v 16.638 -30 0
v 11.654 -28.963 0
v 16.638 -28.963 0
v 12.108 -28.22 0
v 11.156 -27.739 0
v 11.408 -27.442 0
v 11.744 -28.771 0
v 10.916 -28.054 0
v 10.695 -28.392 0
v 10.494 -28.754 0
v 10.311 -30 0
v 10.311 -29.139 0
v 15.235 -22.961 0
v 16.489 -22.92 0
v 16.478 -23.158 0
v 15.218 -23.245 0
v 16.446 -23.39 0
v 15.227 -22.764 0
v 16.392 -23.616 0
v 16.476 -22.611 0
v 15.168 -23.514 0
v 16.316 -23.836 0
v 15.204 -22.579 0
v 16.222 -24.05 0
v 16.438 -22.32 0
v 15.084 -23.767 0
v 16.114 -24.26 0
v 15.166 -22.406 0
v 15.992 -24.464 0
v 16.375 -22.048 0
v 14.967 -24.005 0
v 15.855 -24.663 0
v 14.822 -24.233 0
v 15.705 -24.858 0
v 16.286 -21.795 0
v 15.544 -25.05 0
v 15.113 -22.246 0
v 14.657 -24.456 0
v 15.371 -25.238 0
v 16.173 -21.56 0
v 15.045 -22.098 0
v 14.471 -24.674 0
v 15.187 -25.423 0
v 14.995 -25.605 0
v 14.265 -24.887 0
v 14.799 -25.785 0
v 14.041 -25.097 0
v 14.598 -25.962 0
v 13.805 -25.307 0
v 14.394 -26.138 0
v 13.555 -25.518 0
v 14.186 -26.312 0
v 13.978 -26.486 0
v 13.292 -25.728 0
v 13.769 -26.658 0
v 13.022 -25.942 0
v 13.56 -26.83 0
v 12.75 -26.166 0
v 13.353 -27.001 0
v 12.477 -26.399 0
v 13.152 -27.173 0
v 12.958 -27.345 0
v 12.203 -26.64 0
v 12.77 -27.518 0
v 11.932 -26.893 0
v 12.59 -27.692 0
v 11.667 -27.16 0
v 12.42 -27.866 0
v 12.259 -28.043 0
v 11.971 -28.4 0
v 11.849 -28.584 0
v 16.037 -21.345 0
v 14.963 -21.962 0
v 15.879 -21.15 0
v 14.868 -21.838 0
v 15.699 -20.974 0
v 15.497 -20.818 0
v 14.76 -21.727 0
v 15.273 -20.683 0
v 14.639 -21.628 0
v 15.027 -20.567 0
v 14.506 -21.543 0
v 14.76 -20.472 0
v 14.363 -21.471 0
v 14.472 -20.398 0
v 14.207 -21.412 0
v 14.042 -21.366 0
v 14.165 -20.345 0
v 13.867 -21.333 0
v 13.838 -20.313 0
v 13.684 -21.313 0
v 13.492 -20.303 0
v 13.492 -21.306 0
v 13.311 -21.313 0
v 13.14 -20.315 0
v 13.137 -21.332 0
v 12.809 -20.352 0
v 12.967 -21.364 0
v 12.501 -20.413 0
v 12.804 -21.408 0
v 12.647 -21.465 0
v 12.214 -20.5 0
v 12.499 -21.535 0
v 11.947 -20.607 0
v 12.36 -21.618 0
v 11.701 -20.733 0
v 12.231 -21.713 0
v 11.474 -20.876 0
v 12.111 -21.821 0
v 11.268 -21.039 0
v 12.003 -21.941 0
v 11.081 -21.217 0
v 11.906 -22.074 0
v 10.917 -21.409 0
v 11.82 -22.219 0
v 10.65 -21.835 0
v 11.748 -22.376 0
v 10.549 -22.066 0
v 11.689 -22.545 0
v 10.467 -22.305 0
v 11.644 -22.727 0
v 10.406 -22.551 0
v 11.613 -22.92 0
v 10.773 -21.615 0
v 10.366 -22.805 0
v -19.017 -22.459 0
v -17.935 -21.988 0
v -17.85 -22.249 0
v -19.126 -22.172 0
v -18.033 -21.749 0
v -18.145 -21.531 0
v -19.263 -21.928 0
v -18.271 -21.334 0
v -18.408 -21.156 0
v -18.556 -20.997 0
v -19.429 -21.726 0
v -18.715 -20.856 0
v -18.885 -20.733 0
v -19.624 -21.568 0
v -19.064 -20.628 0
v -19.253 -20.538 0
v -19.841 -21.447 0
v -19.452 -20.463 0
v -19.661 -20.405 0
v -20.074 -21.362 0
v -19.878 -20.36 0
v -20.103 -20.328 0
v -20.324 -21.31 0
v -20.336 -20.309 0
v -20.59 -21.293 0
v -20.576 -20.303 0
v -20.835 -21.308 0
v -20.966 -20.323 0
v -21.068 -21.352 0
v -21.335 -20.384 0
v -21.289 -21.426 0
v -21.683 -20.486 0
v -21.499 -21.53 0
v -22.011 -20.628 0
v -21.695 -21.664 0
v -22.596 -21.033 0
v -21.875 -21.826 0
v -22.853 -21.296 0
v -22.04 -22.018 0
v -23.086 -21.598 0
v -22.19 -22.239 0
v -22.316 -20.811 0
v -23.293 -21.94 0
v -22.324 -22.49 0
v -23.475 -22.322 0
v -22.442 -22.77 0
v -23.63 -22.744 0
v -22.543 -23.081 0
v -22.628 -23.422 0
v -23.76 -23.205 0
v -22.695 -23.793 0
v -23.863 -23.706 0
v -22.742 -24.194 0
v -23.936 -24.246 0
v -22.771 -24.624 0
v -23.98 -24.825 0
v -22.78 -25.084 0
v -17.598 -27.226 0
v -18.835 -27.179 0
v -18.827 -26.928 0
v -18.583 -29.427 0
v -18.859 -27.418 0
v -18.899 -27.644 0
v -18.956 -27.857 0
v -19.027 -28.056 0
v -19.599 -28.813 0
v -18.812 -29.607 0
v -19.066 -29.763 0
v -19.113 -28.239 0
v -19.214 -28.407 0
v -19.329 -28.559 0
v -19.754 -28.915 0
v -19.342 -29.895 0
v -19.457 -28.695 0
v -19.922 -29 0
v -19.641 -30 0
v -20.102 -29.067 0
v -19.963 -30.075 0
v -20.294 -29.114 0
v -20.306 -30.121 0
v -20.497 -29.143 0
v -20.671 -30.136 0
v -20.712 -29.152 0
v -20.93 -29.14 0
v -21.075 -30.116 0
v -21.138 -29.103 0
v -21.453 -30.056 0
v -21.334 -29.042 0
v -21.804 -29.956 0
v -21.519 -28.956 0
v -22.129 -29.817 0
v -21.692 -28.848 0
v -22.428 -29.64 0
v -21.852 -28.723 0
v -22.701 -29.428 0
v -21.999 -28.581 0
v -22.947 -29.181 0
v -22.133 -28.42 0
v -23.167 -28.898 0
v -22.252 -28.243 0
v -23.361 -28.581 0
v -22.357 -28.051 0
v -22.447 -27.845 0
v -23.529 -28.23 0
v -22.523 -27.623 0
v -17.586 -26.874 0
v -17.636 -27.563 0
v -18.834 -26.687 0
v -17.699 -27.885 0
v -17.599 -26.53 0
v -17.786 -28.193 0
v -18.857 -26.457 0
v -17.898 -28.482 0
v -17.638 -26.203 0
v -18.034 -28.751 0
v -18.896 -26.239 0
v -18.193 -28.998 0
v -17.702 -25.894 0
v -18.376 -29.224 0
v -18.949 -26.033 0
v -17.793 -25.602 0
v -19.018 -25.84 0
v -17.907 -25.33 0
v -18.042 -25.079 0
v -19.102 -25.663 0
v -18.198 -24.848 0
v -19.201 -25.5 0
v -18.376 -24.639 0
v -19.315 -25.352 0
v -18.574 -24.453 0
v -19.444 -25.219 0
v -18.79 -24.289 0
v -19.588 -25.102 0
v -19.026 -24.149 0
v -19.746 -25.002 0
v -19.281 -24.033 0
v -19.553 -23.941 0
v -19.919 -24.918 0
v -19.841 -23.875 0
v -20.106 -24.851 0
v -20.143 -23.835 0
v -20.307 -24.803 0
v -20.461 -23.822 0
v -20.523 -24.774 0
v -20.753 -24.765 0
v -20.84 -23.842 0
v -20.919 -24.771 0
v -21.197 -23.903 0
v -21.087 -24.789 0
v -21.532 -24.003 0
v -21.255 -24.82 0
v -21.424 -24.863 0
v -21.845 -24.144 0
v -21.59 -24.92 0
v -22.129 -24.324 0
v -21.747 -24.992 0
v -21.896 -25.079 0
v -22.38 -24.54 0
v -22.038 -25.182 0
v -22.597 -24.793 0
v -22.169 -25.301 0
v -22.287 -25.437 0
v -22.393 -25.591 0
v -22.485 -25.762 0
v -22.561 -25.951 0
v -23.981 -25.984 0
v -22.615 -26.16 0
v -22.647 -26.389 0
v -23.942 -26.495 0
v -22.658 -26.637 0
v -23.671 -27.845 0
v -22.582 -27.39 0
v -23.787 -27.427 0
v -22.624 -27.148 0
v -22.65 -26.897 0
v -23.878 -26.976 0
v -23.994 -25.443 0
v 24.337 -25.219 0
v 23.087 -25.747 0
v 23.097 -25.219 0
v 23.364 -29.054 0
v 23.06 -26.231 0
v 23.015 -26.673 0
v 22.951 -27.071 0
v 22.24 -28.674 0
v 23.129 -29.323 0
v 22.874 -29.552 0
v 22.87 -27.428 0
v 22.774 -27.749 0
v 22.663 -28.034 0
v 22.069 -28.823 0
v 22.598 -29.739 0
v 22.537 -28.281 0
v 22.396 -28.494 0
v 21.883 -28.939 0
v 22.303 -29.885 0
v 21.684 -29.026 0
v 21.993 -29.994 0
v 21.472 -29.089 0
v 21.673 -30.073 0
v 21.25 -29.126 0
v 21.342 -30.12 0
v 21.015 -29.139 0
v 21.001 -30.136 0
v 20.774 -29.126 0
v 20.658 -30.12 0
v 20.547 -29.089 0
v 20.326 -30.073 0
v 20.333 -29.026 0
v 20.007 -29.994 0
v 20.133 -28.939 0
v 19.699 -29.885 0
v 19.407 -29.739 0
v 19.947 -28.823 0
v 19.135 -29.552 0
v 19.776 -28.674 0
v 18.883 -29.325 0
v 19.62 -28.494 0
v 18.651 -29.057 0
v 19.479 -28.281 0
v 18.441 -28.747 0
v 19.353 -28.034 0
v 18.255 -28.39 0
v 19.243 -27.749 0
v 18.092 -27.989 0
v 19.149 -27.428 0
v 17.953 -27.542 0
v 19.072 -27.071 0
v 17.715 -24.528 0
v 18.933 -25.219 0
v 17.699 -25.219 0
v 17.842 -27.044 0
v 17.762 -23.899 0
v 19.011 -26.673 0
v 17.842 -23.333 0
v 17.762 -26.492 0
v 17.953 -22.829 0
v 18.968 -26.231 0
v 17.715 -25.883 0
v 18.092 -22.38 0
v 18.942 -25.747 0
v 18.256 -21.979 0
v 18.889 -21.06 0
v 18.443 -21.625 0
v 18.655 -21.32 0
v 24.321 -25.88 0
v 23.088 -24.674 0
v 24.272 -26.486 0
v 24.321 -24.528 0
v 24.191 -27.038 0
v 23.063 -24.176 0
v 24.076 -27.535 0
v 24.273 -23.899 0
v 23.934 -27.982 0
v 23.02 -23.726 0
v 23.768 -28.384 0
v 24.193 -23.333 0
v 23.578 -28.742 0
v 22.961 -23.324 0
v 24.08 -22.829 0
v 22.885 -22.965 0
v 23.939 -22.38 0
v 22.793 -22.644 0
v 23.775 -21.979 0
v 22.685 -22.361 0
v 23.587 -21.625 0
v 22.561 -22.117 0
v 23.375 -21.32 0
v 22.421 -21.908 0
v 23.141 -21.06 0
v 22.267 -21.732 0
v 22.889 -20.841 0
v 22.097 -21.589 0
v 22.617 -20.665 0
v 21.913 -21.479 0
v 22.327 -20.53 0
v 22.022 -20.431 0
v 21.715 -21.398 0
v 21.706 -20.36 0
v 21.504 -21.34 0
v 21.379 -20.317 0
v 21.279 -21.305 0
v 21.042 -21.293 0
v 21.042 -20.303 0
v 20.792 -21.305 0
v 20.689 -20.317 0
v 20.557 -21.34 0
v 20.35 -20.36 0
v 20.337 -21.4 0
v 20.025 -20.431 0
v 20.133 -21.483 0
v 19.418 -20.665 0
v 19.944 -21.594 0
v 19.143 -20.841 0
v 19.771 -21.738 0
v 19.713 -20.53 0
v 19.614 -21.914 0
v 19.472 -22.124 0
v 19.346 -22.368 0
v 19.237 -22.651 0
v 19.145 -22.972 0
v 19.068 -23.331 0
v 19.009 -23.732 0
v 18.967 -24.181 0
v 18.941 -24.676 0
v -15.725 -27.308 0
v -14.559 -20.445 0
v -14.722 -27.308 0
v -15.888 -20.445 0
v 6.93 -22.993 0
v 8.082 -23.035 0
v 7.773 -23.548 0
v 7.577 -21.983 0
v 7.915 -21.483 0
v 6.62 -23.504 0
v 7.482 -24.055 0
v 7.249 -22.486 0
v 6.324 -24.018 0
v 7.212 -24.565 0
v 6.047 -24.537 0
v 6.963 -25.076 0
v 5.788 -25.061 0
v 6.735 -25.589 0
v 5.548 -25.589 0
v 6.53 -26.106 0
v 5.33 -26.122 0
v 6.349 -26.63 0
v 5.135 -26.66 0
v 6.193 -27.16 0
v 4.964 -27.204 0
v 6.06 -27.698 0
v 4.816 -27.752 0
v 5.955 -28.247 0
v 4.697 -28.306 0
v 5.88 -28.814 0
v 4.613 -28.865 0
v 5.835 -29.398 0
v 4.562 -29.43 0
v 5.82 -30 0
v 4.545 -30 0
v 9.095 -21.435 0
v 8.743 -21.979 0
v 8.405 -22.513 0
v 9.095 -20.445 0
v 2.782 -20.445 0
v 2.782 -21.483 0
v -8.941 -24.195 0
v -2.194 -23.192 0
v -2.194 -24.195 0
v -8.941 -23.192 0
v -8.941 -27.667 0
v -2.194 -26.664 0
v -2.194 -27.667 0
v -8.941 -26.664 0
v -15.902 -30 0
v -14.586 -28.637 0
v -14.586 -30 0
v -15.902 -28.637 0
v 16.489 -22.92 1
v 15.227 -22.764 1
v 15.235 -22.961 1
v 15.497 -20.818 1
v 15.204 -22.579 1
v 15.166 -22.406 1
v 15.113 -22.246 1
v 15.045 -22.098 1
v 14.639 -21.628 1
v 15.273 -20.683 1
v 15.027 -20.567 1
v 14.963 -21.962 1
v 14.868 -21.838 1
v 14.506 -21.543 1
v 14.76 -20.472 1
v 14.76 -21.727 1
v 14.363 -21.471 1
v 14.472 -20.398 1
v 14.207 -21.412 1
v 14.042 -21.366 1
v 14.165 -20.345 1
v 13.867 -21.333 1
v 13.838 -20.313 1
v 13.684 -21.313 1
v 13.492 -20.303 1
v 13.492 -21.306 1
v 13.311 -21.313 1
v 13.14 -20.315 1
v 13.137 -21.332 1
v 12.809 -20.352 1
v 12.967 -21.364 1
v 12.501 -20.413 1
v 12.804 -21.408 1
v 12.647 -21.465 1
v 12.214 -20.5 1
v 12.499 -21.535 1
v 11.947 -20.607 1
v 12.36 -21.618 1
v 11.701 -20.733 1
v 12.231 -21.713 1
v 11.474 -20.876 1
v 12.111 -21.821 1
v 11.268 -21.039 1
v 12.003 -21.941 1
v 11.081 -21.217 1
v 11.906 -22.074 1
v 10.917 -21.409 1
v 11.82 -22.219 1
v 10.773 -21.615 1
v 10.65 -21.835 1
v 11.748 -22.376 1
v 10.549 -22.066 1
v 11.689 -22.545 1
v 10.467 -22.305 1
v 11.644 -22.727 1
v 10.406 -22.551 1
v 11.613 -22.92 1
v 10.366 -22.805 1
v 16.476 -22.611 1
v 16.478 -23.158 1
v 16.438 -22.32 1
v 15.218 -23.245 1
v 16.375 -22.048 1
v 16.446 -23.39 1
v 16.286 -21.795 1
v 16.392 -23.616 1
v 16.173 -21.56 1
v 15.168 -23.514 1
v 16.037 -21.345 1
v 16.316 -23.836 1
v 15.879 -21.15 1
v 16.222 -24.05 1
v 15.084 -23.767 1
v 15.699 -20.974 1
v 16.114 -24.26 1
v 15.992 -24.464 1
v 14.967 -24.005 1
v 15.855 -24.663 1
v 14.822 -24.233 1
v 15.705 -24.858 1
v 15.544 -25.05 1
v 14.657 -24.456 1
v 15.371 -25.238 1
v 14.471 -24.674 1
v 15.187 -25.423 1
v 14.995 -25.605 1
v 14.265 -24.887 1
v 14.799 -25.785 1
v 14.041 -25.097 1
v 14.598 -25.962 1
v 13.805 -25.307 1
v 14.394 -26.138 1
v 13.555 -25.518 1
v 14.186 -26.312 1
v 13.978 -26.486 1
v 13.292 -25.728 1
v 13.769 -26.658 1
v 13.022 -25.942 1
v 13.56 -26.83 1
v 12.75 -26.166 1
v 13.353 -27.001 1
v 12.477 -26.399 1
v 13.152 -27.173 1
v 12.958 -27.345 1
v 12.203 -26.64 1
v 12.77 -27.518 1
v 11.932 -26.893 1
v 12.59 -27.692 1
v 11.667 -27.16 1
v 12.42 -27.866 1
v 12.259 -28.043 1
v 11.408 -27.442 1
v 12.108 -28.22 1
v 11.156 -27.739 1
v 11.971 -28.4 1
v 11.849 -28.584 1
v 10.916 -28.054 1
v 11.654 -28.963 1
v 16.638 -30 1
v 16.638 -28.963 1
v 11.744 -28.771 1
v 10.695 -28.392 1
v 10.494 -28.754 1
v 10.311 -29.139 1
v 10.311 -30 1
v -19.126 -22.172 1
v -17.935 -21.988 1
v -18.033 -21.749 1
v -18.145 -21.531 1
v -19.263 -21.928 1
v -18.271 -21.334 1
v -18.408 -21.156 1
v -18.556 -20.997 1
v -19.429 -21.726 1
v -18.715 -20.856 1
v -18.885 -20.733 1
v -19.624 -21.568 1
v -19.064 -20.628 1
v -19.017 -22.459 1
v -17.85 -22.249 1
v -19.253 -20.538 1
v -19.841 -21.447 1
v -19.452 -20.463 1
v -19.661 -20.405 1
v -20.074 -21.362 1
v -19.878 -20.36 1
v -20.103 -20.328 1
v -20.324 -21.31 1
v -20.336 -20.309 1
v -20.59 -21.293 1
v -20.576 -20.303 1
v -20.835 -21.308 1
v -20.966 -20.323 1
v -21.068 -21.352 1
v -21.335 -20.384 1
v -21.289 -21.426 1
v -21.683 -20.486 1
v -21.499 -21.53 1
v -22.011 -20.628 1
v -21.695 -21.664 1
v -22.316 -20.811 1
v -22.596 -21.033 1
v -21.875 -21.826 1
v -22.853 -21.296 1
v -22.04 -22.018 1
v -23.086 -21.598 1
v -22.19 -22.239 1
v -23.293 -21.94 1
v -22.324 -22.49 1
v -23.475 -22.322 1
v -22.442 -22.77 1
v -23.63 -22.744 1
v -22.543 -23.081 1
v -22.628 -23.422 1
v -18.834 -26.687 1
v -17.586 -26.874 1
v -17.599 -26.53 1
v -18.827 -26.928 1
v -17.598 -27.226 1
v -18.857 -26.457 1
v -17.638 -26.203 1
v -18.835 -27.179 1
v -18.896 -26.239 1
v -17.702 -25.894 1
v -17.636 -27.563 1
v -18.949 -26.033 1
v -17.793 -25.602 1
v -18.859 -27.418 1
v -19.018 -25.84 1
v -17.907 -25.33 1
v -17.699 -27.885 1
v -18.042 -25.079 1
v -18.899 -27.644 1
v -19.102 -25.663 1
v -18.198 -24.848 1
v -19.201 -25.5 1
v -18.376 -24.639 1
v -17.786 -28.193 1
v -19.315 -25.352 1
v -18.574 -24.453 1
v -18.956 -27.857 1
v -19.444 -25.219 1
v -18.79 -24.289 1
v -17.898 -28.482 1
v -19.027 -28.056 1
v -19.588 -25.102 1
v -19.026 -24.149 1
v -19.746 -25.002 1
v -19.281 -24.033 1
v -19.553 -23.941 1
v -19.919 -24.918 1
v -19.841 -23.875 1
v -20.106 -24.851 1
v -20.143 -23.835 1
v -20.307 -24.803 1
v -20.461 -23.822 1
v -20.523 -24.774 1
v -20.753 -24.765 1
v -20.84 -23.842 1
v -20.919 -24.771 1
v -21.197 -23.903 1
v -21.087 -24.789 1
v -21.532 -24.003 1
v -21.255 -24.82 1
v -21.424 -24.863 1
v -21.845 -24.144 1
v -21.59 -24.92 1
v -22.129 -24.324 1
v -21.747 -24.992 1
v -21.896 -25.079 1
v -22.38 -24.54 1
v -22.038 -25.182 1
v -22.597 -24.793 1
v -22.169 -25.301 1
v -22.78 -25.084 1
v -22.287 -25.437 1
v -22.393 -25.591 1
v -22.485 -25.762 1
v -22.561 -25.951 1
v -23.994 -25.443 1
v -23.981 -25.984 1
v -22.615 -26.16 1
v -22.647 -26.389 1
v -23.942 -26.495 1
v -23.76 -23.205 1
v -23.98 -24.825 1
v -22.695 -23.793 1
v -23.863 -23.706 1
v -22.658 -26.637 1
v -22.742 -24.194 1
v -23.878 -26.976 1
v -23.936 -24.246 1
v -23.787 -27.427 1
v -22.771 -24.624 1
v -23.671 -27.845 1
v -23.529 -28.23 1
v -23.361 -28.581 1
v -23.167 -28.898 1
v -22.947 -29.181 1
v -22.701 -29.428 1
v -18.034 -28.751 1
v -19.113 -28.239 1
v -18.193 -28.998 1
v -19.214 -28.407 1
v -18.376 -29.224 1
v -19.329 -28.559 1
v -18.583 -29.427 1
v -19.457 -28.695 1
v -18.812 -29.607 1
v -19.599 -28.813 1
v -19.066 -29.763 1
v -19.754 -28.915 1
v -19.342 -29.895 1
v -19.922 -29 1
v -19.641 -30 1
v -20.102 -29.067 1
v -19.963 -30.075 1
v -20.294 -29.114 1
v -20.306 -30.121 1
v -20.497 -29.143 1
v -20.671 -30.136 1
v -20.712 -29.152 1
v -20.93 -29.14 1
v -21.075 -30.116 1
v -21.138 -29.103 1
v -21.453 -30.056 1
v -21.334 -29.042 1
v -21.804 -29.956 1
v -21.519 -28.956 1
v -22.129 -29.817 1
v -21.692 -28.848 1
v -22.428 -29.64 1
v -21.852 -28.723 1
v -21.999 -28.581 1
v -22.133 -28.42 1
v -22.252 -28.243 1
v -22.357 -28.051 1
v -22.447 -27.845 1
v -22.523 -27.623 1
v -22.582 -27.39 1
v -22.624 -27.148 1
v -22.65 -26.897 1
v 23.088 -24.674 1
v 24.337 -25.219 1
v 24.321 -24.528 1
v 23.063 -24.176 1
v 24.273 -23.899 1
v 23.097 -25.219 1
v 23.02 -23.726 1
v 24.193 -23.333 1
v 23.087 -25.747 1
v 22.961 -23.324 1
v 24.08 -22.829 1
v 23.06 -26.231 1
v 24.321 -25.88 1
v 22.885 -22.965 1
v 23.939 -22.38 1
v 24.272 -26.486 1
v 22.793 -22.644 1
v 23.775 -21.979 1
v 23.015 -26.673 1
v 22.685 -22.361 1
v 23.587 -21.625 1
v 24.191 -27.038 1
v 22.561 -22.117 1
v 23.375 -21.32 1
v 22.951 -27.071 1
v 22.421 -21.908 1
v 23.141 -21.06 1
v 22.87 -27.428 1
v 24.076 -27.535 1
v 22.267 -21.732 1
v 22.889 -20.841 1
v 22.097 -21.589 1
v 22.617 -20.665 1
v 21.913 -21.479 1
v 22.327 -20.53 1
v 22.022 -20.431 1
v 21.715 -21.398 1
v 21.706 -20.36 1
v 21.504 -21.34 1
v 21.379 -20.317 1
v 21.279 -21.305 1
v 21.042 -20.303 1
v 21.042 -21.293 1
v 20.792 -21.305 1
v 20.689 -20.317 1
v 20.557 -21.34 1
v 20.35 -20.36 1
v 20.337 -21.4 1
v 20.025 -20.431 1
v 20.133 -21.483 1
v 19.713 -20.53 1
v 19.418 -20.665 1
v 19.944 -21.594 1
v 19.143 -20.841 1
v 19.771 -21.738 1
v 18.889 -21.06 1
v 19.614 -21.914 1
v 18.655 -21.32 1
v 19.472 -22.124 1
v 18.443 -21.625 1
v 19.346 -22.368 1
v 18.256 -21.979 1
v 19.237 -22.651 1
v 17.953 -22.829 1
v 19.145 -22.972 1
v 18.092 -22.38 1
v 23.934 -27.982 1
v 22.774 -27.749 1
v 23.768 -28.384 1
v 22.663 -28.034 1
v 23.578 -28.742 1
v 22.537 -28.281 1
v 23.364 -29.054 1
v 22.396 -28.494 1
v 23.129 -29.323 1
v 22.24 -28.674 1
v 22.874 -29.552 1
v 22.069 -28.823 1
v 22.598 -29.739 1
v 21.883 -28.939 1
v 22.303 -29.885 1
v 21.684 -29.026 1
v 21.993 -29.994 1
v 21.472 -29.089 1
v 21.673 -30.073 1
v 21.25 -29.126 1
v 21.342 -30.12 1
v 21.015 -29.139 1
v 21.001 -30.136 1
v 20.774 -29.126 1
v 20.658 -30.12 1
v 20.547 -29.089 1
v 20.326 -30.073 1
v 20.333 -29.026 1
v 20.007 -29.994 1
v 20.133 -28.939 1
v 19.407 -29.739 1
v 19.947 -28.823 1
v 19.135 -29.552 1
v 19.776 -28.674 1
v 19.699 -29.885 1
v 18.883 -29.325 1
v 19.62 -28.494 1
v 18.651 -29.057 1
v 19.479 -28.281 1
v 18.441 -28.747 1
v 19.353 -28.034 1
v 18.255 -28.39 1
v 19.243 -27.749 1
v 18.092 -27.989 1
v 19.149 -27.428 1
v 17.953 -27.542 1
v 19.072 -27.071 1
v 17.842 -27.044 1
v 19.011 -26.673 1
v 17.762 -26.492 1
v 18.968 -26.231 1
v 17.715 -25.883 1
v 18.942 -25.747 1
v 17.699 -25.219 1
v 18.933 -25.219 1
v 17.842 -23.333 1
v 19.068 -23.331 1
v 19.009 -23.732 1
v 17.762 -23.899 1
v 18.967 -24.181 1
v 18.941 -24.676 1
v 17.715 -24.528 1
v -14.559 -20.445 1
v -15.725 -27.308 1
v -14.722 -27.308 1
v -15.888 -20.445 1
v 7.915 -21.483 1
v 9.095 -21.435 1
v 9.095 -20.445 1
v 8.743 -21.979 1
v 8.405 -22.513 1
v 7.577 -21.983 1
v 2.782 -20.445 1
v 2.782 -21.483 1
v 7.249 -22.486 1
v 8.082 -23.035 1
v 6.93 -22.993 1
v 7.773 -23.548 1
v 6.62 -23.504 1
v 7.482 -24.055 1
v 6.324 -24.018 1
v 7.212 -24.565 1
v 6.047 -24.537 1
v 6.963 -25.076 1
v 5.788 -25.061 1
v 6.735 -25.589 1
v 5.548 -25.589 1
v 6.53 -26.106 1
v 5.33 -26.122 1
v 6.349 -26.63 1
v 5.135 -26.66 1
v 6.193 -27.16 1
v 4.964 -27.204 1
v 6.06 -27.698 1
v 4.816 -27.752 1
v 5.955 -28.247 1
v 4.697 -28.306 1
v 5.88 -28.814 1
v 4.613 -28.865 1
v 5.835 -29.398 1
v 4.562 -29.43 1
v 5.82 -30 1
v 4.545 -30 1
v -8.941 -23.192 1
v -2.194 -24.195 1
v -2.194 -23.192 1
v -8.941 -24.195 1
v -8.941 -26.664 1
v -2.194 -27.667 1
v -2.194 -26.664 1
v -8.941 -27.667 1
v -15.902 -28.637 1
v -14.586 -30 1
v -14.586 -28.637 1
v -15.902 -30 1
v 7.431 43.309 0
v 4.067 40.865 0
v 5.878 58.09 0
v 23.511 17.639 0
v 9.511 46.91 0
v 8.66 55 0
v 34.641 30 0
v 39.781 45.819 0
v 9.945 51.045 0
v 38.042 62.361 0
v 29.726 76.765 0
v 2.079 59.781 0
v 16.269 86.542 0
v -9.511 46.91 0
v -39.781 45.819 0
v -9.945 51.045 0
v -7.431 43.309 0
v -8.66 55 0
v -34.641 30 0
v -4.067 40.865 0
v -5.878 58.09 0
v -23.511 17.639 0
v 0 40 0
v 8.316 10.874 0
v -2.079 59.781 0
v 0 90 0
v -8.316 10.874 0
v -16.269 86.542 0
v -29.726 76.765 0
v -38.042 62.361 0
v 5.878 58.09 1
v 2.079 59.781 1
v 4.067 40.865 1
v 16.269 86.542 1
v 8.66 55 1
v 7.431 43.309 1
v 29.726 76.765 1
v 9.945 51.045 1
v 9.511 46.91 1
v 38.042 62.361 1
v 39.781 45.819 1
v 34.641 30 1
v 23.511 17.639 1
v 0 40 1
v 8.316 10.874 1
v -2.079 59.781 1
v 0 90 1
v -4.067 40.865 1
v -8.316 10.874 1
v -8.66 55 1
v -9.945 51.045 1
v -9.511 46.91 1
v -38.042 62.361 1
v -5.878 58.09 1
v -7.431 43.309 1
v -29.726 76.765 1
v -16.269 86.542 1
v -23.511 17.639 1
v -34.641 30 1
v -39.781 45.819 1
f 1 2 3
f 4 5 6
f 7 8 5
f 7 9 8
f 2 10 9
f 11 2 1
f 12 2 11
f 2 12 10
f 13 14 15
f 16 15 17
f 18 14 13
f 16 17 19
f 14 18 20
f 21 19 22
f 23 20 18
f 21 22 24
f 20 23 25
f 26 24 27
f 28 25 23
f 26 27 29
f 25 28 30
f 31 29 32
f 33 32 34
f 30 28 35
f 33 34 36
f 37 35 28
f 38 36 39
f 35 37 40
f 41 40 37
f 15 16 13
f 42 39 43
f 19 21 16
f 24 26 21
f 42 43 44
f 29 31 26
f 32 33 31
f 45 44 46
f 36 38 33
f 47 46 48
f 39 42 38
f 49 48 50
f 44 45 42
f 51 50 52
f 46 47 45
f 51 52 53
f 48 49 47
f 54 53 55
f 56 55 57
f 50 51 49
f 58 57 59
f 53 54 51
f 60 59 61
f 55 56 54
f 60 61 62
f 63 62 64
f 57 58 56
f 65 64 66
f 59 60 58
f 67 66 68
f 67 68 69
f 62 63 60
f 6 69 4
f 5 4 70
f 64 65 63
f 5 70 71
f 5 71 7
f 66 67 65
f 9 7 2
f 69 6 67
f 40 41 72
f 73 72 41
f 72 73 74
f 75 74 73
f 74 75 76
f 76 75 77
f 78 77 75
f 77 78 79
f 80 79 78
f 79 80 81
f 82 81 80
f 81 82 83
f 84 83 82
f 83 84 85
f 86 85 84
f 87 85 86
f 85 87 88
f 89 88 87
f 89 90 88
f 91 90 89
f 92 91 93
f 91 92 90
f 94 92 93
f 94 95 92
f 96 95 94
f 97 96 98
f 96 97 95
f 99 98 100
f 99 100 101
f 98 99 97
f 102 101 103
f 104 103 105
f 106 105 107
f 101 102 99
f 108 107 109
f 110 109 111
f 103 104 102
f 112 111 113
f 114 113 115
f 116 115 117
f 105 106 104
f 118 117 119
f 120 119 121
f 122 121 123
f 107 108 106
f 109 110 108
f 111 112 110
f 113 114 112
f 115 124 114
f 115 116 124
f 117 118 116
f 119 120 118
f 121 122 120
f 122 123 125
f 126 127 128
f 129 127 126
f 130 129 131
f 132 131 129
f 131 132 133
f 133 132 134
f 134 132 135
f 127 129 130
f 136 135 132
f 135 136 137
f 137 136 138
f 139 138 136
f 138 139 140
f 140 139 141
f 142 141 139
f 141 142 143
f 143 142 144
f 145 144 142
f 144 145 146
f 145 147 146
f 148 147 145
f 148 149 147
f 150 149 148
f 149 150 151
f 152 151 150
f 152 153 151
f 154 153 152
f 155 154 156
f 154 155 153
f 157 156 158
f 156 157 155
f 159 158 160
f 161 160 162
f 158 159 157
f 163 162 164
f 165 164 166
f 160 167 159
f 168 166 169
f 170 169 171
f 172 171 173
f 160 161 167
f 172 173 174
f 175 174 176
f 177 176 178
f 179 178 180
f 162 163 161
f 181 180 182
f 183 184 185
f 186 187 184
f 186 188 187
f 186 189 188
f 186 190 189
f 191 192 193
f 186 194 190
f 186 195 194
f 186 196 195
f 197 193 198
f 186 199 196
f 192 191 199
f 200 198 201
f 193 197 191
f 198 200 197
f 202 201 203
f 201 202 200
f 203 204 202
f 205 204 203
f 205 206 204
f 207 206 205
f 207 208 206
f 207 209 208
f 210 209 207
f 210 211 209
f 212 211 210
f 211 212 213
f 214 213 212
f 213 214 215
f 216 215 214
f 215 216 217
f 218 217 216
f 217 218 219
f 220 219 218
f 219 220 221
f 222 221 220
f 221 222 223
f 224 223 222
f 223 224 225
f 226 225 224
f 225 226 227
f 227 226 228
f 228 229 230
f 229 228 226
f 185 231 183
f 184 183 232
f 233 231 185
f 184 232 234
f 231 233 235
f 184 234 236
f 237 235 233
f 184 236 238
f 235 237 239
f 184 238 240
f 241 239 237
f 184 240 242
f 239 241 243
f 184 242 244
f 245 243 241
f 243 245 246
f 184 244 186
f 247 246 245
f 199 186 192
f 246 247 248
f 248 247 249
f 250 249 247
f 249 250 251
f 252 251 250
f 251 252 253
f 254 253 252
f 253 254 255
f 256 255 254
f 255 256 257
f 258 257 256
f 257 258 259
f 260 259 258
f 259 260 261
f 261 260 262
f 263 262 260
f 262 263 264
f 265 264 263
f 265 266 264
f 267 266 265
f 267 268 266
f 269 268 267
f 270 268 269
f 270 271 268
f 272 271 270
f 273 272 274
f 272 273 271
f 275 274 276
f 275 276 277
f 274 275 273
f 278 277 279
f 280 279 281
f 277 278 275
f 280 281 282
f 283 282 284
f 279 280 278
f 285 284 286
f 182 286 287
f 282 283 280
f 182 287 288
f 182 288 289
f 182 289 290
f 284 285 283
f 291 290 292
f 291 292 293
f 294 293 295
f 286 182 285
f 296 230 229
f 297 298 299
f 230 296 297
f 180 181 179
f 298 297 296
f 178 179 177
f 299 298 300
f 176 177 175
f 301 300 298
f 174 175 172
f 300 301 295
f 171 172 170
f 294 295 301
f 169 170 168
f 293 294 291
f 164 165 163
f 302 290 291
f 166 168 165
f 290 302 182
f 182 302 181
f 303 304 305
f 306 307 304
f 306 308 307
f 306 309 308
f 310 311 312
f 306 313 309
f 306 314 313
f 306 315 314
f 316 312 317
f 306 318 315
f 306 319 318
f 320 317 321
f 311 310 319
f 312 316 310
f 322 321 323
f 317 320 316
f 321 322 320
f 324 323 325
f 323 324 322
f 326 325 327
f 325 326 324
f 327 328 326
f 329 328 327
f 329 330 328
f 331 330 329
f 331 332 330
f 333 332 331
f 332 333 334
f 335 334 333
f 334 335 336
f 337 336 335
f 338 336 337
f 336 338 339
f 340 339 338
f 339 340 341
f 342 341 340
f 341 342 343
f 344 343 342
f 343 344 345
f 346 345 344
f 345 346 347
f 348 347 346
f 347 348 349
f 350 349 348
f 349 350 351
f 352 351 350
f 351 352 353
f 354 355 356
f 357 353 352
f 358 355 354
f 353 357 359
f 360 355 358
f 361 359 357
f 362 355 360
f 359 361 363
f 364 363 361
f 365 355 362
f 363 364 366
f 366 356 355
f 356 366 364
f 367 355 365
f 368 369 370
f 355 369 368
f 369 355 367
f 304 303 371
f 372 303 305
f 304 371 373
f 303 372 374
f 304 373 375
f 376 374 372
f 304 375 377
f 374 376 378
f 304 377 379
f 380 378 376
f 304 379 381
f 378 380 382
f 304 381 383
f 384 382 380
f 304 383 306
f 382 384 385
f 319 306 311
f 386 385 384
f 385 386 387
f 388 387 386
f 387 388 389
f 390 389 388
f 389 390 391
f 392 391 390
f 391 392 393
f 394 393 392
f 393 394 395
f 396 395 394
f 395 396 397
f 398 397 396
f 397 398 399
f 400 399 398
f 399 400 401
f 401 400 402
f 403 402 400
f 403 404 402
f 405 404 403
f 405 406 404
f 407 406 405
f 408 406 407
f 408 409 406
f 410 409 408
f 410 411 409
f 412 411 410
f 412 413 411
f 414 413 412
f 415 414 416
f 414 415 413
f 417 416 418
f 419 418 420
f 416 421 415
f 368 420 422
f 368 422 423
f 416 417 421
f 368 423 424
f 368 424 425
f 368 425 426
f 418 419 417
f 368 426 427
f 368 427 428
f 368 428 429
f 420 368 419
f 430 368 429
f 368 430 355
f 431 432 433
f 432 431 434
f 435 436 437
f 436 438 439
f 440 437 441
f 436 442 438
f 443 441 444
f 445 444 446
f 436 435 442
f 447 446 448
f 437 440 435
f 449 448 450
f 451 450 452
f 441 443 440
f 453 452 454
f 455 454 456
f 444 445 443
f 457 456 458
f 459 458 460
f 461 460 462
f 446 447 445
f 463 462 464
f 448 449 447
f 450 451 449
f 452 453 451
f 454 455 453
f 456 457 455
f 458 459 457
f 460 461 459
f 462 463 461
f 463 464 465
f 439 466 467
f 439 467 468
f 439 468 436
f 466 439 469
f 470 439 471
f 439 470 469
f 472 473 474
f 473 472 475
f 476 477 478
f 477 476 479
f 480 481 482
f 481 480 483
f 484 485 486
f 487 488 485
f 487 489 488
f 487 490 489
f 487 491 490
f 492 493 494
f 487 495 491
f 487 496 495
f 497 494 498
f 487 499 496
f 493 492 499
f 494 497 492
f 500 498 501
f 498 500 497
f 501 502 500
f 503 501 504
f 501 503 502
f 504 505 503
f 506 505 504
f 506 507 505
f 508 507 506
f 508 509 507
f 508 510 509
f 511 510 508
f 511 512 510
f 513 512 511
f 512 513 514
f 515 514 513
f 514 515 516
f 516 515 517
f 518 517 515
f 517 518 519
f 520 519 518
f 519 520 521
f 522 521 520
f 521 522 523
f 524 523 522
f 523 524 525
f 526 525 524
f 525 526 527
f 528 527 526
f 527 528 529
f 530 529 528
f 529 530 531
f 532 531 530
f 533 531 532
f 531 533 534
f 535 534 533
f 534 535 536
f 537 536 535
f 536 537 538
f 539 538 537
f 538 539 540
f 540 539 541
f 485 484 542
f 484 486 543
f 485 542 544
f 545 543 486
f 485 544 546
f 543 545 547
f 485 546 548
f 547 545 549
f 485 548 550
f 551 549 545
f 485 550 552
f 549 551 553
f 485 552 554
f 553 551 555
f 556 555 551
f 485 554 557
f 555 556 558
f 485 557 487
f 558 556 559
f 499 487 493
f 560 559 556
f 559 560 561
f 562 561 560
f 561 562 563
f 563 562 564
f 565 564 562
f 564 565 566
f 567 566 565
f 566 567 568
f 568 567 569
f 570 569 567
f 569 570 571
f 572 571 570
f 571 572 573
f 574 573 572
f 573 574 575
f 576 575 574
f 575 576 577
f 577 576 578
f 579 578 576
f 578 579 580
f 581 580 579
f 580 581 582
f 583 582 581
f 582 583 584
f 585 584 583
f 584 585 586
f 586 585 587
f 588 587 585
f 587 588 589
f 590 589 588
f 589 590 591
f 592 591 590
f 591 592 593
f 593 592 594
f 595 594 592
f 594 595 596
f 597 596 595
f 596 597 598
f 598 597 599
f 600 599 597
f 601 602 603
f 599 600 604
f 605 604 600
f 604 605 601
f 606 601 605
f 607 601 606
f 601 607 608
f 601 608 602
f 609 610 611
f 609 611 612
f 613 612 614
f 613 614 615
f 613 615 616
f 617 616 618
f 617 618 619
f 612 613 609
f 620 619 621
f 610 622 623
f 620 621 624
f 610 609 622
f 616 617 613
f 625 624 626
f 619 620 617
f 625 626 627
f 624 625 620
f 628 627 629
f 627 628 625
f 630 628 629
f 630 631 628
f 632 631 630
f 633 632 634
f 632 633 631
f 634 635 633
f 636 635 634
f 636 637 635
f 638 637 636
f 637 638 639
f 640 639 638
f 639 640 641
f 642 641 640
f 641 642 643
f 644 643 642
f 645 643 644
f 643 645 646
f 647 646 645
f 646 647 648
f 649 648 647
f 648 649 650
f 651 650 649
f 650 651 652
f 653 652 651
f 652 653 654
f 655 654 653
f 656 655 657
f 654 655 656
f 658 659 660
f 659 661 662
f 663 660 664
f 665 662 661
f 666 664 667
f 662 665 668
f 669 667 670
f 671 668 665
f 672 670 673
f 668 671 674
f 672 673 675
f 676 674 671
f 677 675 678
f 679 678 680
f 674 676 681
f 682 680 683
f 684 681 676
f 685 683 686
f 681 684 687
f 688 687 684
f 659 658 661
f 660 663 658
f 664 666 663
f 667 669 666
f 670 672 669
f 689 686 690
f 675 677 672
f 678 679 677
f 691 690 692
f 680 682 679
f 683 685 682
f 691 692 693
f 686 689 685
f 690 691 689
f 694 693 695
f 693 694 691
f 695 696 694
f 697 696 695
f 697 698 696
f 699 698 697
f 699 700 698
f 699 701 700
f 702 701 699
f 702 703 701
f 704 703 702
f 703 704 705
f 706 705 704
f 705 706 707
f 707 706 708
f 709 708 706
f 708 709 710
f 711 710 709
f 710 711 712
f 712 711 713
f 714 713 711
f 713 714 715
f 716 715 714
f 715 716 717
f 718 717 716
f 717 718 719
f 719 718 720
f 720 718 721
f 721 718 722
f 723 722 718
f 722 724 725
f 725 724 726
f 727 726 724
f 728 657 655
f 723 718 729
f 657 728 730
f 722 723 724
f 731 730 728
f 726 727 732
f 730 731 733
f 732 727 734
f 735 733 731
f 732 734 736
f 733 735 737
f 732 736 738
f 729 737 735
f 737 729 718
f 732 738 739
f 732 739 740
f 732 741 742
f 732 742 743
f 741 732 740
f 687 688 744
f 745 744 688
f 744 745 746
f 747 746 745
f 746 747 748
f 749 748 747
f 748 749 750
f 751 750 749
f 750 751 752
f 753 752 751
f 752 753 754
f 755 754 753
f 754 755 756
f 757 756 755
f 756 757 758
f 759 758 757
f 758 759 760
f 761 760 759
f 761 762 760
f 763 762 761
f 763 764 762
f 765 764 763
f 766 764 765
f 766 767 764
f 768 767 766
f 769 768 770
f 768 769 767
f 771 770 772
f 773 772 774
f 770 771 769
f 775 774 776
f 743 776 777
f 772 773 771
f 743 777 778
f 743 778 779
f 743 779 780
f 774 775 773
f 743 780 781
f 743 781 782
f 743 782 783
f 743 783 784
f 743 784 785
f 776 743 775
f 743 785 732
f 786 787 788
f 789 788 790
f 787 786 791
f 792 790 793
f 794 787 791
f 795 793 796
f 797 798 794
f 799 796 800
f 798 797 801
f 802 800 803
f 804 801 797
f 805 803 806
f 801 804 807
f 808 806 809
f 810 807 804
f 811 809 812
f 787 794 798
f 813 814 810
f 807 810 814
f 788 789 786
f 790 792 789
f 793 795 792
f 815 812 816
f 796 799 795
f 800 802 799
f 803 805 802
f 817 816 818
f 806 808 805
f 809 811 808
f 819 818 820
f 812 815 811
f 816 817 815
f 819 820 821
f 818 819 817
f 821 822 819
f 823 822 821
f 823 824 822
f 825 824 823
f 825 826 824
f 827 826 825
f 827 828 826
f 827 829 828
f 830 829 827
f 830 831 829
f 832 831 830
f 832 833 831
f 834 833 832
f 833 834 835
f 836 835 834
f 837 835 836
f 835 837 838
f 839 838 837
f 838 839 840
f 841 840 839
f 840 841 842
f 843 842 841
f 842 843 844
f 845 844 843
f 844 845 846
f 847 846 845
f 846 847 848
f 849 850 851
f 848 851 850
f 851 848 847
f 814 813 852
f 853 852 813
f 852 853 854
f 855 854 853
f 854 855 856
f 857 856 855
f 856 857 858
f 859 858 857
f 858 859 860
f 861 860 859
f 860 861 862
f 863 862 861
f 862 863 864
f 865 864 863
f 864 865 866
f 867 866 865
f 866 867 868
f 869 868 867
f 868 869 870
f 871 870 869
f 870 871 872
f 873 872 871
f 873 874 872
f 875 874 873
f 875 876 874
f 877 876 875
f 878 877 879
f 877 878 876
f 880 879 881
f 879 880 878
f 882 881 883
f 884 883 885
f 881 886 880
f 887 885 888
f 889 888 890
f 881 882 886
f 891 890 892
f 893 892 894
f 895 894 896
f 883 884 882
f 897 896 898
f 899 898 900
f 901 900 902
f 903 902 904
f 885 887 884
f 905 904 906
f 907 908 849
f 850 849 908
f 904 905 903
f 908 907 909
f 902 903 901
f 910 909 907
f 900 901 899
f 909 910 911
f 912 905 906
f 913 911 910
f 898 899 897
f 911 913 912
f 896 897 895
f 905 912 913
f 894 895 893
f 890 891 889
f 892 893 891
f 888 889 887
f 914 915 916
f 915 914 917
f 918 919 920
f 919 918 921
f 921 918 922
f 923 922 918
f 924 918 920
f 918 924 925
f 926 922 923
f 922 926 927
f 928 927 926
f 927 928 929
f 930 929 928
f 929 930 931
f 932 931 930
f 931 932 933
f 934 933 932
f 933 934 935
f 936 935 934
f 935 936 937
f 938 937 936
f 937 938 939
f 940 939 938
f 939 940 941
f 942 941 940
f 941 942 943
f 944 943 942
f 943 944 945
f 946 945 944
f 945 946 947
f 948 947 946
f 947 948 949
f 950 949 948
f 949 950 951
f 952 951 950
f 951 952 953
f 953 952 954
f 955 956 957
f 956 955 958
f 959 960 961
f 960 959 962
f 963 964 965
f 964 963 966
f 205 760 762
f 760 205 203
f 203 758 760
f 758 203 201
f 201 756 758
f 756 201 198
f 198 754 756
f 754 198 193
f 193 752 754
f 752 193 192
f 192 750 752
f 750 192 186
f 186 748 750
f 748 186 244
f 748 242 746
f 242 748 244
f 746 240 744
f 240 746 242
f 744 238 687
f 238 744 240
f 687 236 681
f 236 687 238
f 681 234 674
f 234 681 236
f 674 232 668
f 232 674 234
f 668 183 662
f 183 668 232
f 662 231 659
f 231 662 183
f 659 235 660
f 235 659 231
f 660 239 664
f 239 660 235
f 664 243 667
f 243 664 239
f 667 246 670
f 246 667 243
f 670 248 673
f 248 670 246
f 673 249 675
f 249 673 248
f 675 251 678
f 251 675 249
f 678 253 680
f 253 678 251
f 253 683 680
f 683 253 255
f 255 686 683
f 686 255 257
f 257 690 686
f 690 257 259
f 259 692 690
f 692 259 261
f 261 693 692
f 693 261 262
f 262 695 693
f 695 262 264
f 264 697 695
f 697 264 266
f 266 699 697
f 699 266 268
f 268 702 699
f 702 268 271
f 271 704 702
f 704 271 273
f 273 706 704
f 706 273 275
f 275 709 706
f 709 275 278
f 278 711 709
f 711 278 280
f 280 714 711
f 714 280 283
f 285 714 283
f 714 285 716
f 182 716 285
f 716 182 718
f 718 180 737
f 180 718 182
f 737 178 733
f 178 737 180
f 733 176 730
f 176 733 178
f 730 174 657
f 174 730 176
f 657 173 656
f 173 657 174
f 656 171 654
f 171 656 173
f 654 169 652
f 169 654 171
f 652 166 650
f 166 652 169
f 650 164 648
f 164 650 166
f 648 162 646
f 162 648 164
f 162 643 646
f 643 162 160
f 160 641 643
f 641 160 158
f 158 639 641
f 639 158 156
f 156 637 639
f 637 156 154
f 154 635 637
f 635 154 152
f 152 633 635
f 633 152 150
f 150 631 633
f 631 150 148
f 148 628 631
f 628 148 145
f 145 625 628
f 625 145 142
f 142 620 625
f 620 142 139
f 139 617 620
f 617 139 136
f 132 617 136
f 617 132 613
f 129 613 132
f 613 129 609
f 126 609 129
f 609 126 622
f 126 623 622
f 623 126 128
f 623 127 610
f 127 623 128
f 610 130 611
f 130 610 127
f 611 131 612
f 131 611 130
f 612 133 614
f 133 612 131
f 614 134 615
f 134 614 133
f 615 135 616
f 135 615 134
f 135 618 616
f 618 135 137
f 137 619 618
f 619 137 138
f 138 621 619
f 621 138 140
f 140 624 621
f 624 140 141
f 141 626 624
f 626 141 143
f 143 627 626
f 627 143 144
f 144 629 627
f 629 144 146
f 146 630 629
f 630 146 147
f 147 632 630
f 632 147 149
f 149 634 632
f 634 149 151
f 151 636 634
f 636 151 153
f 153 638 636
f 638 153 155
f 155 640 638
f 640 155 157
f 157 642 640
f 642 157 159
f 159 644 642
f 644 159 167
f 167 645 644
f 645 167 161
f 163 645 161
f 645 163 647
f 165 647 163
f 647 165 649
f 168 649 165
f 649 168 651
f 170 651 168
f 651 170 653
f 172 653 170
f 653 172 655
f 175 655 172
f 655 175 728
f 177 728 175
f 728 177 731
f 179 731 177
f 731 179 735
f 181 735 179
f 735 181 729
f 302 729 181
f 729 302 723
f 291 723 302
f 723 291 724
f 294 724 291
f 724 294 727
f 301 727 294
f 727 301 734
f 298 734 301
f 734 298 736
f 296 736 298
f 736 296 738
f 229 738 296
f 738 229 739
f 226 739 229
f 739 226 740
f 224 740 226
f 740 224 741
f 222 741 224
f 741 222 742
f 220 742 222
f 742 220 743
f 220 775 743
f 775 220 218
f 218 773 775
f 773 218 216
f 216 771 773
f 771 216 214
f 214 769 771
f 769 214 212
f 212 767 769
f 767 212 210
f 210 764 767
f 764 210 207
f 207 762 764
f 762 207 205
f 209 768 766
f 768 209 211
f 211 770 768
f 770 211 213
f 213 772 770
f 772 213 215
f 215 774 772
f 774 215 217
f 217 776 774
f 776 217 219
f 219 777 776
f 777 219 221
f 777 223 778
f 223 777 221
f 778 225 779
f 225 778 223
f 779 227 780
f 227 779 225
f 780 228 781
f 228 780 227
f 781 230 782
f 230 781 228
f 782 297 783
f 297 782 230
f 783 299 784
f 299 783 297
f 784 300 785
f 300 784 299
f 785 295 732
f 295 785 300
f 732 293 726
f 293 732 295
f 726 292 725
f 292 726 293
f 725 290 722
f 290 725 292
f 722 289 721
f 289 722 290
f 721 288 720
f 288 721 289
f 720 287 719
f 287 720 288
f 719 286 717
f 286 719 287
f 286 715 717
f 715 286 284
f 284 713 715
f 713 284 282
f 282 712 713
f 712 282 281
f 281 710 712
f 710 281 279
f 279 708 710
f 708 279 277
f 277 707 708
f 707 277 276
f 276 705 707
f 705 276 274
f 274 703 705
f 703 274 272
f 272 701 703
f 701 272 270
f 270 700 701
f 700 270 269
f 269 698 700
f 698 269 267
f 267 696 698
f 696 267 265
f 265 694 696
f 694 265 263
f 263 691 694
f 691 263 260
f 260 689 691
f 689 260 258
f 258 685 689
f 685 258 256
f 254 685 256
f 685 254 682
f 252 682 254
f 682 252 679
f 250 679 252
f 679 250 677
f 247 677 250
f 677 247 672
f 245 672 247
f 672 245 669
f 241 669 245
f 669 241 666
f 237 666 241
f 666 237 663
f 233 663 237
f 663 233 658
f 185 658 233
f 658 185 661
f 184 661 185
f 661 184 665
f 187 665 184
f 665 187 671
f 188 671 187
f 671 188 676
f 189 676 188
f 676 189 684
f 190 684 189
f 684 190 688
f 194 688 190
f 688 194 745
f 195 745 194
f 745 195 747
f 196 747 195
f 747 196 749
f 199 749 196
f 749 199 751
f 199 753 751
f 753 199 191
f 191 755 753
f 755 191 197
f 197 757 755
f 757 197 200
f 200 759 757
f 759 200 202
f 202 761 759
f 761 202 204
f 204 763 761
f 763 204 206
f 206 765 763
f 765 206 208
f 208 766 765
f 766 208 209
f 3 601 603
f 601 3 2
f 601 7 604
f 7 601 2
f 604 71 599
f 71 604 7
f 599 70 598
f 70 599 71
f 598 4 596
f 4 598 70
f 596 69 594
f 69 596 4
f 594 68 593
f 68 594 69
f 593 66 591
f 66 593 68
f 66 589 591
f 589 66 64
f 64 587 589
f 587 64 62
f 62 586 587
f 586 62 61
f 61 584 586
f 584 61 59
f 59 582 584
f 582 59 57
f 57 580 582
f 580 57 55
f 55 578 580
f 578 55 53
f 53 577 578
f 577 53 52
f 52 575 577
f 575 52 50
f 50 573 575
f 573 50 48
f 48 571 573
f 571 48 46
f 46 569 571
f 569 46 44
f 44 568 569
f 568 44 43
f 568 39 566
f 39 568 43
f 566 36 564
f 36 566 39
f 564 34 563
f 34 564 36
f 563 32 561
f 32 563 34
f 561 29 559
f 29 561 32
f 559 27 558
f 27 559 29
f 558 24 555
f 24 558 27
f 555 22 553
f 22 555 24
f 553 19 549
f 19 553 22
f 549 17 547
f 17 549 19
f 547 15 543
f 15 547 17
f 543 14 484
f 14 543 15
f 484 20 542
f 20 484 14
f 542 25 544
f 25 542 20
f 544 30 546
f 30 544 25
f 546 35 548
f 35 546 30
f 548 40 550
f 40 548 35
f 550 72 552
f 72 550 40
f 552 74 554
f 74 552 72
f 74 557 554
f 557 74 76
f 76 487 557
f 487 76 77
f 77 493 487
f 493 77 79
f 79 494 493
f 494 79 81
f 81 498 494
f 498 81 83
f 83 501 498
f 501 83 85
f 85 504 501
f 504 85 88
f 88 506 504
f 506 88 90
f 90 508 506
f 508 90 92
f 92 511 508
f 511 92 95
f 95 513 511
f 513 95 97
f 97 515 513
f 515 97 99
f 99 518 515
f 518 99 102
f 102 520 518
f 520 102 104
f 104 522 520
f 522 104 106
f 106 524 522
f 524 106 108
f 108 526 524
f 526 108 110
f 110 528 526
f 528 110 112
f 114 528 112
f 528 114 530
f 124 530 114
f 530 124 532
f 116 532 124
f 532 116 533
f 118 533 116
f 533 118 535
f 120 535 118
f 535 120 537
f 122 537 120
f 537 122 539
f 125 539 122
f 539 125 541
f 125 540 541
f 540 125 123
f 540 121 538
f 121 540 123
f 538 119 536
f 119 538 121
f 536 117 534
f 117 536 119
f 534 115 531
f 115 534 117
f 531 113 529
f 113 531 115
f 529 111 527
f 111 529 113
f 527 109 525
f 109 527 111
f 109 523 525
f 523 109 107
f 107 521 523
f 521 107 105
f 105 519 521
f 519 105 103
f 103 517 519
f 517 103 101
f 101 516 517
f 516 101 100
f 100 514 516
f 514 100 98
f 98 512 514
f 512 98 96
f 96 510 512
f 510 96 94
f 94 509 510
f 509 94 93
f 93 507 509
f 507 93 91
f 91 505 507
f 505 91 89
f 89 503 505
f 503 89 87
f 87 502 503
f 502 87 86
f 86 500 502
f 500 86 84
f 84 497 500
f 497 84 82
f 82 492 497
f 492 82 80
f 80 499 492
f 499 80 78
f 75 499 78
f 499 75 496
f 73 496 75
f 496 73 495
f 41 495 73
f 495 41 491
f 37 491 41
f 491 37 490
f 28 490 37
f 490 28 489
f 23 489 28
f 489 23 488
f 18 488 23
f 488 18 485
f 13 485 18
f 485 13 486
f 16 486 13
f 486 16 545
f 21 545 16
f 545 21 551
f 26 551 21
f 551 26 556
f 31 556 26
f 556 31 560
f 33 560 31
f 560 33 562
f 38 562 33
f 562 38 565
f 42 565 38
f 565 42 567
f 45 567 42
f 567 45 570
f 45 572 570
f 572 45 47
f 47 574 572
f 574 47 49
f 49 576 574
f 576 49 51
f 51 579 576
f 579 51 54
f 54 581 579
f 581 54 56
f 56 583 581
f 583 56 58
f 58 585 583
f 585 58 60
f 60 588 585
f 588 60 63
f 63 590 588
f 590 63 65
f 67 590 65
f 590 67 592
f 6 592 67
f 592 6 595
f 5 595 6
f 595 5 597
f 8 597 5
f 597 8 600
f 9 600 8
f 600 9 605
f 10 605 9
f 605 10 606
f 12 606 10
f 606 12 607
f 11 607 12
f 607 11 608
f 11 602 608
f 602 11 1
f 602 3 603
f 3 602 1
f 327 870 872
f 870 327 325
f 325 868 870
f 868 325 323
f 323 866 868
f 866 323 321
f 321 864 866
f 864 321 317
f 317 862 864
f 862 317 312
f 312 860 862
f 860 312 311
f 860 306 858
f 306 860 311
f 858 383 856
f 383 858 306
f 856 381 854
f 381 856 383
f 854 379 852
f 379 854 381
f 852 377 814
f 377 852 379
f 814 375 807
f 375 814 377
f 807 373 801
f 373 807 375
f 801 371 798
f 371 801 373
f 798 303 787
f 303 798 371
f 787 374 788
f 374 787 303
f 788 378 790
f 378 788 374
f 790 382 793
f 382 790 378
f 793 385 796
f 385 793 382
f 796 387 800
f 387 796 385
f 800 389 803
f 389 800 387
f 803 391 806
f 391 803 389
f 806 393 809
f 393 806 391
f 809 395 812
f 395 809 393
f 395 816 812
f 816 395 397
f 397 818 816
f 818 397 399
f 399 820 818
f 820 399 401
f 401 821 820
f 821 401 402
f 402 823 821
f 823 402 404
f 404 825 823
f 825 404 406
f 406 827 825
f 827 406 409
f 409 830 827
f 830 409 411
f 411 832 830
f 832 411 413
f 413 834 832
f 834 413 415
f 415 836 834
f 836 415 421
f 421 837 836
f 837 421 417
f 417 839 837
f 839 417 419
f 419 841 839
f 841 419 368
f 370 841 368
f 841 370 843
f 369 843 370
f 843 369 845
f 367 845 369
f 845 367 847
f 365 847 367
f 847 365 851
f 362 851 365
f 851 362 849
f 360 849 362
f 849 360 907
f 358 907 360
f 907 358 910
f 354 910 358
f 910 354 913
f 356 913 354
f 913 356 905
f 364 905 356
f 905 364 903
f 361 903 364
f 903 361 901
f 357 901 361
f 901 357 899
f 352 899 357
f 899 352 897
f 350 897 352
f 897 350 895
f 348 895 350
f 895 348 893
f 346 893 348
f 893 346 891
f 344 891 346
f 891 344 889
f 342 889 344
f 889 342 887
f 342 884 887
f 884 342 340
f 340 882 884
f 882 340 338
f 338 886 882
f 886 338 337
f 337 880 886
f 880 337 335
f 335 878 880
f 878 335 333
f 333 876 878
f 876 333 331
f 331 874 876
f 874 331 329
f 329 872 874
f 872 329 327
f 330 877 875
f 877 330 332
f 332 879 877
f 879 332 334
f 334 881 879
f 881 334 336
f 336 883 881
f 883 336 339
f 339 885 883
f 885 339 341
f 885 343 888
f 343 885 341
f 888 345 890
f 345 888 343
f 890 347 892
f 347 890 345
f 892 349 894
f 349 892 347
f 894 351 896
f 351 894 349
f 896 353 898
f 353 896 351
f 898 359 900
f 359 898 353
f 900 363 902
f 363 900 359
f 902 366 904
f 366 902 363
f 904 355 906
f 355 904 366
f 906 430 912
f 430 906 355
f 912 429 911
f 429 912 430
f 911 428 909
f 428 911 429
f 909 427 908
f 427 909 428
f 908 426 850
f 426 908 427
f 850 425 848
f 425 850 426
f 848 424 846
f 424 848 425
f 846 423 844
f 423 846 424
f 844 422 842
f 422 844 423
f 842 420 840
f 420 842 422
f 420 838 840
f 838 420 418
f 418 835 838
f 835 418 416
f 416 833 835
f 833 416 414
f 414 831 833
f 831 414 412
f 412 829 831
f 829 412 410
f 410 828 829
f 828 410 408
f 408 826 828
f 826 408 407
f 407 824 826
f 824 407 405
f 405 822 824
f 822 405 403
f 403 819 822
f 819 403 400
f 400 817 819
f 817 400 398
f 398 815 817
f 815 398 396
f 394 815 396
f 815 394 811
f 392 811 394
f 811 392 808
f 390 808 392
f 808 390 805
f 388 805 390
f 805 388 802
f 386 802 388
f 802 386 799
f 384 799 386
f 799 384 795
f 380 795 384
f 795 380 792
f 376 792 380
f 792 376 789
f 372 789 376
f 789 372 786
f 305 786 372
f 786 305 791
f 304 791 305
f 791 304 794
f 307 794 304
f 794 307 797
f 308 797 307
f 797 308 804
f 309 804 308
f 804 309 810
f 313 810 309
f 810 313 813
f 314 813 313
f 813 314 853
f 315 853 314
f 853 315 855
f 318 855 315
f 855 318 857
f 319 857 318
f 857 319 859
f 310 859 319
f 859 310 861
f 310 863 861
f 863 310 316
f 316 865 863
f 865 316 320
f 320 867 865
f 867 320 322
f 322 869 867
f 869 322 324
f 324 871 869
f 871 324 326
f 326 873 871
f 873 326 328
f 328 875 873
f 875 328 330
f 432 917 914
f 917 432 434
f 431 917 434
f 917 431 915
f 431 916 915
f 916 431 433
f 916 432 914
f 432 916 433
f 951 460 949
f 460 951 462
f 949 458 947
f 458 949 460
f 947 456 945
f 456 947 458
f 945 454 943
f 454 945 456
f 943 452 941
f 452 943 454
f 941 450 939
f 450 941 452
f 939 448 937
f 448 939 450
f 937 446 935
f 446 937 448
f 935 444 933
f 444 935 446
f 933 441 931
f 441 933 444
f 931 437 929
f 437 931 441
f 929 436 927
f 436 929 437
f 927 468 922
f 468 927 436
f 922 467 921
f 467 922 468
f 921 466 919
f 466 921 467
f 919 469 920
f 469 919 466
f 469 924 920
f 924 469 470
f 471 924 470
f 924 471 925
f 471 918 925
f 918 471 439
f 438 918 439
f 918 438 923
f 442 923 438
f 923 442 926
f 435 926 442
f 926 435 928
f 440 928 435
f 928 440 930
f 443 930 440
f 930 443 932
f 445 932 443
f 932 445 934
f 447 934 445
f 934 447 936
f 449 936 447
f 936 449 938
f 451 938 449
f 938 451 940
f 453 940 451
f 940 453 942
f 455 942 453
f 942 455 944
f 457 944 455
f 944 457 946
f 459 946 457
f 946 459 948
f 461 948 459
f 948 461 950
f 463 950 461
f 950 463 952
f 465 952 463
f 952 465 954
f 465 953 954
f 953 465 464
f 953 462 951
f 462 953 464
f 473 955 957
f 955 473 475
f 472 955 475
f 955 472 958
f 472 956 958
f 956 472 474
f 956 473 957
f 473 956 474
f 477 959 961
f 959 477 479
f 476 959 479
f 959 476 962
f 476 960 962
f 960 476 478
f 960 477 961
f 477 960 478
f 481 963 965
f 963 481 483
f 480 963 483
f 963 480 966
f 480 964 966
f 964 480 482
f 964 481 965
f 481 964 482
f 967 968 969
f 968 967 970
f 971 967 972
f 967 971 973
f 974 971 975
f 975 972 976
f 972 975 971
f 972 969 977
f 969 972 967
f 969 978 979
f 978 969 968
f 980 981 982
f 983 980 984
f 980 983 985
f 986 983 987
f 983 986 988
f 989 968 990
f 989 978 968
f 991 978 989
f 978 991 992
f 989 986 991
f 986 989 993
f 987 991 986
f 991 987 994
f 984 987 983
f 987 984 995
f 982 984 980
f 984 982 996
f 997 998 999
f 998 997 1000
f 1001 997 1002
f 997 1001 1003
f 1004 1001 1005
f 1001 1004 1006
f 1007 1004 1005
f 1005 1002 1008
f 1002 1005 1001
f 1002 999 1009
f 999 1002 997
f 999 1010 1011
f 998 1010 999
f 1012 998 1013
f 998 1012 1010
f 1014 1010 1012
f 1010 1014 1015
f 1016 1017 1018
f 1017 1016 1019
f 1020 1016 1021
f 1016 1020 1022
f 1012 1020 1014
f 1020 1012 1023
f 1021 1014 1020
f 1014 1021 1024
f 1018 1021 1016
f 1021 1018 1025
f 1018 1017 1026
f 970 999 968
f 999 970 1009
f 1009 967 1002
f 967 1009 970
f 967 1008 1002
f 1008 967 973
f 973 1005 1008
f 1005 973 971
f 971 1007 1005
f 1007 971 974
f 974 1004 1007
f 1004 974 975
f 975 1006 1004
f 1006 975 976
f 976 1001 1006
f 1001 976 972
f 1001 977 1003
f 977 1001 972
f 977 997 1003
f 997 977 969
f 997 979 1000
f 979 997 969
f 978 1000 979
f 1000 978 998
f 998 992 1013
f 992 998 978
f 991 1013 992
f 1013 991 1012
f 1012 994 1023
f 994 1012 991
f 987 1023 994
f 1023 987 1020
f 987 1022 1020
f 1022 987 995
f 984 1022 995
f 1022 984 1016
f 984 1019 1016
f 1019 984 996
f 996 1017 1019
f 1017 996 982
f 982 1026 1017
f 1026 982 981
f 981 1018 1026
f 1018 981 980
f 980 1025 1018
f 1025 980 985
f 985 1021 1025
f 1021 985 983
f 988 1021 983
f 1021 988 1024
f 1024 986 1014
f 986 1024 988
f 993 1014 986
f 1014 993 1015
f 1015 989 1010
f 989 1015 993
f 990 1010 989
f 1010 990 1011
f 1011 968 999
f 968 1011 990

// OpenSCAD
echo(version=version());

// Recursive functions are very powerful for calculating values.
// A good number of algorithms make use of recursive definitions,
// e.g the caluclation of the factorial of a number.
// The ternary operator " ? : " is the easiest way to define the
// termination condition.
// Note how the following simple implementation will never terminate
// when called with a negative value. This will produce an error after
// some time when OpenSCAD detects the endless recursive call.
function factorial(n) = n == 0 ? 1 : factorial(n - 1) * n;

color("cyan")
    translate([0, -30, 0])
        linear_extrude(height = 1)
            text(str("6! = ", factorial(6)), halign = "center");

// With recursive functions very complex results can be generated,
// e.g. calculating the outline of a star shaped polygon. Using
// default parameters can help with simplifying the usage of functions
// that have multiple parameters.
function point(angle) = [ sin(angle), cos(angle) ];
function radius(i, r1, r2) = (i % 2) == 0 ? r1 : r2;
function star(count, r1, r2, i = 0, result = []) = i < count
    ? star(count, r1, r2, i + 1, concat(result, [ radius(i, r1, r2) * point(360 / count * i) ]))
    : result;

color("yellow")
    translate([0, 50, 0])
        linear_extrude(height = 1)
            polygon(star(30, 40, 10));



// Written in 2015 by Torsten Paul &ltTorsten.Paul@gmx.de>
//
// To the extent possible under law, the author(s) have dedicated all
// copyright and related and neighboring rights to this software to the
// public domain worldwide. This software is distributed without any
// warranty.
//
// You should have received a copy of the CC0 Public Domain
// Dedication along with this software.
// If not, see &lthttp://creativecommons.org/publicdomain/zero/1.0/&gt.
